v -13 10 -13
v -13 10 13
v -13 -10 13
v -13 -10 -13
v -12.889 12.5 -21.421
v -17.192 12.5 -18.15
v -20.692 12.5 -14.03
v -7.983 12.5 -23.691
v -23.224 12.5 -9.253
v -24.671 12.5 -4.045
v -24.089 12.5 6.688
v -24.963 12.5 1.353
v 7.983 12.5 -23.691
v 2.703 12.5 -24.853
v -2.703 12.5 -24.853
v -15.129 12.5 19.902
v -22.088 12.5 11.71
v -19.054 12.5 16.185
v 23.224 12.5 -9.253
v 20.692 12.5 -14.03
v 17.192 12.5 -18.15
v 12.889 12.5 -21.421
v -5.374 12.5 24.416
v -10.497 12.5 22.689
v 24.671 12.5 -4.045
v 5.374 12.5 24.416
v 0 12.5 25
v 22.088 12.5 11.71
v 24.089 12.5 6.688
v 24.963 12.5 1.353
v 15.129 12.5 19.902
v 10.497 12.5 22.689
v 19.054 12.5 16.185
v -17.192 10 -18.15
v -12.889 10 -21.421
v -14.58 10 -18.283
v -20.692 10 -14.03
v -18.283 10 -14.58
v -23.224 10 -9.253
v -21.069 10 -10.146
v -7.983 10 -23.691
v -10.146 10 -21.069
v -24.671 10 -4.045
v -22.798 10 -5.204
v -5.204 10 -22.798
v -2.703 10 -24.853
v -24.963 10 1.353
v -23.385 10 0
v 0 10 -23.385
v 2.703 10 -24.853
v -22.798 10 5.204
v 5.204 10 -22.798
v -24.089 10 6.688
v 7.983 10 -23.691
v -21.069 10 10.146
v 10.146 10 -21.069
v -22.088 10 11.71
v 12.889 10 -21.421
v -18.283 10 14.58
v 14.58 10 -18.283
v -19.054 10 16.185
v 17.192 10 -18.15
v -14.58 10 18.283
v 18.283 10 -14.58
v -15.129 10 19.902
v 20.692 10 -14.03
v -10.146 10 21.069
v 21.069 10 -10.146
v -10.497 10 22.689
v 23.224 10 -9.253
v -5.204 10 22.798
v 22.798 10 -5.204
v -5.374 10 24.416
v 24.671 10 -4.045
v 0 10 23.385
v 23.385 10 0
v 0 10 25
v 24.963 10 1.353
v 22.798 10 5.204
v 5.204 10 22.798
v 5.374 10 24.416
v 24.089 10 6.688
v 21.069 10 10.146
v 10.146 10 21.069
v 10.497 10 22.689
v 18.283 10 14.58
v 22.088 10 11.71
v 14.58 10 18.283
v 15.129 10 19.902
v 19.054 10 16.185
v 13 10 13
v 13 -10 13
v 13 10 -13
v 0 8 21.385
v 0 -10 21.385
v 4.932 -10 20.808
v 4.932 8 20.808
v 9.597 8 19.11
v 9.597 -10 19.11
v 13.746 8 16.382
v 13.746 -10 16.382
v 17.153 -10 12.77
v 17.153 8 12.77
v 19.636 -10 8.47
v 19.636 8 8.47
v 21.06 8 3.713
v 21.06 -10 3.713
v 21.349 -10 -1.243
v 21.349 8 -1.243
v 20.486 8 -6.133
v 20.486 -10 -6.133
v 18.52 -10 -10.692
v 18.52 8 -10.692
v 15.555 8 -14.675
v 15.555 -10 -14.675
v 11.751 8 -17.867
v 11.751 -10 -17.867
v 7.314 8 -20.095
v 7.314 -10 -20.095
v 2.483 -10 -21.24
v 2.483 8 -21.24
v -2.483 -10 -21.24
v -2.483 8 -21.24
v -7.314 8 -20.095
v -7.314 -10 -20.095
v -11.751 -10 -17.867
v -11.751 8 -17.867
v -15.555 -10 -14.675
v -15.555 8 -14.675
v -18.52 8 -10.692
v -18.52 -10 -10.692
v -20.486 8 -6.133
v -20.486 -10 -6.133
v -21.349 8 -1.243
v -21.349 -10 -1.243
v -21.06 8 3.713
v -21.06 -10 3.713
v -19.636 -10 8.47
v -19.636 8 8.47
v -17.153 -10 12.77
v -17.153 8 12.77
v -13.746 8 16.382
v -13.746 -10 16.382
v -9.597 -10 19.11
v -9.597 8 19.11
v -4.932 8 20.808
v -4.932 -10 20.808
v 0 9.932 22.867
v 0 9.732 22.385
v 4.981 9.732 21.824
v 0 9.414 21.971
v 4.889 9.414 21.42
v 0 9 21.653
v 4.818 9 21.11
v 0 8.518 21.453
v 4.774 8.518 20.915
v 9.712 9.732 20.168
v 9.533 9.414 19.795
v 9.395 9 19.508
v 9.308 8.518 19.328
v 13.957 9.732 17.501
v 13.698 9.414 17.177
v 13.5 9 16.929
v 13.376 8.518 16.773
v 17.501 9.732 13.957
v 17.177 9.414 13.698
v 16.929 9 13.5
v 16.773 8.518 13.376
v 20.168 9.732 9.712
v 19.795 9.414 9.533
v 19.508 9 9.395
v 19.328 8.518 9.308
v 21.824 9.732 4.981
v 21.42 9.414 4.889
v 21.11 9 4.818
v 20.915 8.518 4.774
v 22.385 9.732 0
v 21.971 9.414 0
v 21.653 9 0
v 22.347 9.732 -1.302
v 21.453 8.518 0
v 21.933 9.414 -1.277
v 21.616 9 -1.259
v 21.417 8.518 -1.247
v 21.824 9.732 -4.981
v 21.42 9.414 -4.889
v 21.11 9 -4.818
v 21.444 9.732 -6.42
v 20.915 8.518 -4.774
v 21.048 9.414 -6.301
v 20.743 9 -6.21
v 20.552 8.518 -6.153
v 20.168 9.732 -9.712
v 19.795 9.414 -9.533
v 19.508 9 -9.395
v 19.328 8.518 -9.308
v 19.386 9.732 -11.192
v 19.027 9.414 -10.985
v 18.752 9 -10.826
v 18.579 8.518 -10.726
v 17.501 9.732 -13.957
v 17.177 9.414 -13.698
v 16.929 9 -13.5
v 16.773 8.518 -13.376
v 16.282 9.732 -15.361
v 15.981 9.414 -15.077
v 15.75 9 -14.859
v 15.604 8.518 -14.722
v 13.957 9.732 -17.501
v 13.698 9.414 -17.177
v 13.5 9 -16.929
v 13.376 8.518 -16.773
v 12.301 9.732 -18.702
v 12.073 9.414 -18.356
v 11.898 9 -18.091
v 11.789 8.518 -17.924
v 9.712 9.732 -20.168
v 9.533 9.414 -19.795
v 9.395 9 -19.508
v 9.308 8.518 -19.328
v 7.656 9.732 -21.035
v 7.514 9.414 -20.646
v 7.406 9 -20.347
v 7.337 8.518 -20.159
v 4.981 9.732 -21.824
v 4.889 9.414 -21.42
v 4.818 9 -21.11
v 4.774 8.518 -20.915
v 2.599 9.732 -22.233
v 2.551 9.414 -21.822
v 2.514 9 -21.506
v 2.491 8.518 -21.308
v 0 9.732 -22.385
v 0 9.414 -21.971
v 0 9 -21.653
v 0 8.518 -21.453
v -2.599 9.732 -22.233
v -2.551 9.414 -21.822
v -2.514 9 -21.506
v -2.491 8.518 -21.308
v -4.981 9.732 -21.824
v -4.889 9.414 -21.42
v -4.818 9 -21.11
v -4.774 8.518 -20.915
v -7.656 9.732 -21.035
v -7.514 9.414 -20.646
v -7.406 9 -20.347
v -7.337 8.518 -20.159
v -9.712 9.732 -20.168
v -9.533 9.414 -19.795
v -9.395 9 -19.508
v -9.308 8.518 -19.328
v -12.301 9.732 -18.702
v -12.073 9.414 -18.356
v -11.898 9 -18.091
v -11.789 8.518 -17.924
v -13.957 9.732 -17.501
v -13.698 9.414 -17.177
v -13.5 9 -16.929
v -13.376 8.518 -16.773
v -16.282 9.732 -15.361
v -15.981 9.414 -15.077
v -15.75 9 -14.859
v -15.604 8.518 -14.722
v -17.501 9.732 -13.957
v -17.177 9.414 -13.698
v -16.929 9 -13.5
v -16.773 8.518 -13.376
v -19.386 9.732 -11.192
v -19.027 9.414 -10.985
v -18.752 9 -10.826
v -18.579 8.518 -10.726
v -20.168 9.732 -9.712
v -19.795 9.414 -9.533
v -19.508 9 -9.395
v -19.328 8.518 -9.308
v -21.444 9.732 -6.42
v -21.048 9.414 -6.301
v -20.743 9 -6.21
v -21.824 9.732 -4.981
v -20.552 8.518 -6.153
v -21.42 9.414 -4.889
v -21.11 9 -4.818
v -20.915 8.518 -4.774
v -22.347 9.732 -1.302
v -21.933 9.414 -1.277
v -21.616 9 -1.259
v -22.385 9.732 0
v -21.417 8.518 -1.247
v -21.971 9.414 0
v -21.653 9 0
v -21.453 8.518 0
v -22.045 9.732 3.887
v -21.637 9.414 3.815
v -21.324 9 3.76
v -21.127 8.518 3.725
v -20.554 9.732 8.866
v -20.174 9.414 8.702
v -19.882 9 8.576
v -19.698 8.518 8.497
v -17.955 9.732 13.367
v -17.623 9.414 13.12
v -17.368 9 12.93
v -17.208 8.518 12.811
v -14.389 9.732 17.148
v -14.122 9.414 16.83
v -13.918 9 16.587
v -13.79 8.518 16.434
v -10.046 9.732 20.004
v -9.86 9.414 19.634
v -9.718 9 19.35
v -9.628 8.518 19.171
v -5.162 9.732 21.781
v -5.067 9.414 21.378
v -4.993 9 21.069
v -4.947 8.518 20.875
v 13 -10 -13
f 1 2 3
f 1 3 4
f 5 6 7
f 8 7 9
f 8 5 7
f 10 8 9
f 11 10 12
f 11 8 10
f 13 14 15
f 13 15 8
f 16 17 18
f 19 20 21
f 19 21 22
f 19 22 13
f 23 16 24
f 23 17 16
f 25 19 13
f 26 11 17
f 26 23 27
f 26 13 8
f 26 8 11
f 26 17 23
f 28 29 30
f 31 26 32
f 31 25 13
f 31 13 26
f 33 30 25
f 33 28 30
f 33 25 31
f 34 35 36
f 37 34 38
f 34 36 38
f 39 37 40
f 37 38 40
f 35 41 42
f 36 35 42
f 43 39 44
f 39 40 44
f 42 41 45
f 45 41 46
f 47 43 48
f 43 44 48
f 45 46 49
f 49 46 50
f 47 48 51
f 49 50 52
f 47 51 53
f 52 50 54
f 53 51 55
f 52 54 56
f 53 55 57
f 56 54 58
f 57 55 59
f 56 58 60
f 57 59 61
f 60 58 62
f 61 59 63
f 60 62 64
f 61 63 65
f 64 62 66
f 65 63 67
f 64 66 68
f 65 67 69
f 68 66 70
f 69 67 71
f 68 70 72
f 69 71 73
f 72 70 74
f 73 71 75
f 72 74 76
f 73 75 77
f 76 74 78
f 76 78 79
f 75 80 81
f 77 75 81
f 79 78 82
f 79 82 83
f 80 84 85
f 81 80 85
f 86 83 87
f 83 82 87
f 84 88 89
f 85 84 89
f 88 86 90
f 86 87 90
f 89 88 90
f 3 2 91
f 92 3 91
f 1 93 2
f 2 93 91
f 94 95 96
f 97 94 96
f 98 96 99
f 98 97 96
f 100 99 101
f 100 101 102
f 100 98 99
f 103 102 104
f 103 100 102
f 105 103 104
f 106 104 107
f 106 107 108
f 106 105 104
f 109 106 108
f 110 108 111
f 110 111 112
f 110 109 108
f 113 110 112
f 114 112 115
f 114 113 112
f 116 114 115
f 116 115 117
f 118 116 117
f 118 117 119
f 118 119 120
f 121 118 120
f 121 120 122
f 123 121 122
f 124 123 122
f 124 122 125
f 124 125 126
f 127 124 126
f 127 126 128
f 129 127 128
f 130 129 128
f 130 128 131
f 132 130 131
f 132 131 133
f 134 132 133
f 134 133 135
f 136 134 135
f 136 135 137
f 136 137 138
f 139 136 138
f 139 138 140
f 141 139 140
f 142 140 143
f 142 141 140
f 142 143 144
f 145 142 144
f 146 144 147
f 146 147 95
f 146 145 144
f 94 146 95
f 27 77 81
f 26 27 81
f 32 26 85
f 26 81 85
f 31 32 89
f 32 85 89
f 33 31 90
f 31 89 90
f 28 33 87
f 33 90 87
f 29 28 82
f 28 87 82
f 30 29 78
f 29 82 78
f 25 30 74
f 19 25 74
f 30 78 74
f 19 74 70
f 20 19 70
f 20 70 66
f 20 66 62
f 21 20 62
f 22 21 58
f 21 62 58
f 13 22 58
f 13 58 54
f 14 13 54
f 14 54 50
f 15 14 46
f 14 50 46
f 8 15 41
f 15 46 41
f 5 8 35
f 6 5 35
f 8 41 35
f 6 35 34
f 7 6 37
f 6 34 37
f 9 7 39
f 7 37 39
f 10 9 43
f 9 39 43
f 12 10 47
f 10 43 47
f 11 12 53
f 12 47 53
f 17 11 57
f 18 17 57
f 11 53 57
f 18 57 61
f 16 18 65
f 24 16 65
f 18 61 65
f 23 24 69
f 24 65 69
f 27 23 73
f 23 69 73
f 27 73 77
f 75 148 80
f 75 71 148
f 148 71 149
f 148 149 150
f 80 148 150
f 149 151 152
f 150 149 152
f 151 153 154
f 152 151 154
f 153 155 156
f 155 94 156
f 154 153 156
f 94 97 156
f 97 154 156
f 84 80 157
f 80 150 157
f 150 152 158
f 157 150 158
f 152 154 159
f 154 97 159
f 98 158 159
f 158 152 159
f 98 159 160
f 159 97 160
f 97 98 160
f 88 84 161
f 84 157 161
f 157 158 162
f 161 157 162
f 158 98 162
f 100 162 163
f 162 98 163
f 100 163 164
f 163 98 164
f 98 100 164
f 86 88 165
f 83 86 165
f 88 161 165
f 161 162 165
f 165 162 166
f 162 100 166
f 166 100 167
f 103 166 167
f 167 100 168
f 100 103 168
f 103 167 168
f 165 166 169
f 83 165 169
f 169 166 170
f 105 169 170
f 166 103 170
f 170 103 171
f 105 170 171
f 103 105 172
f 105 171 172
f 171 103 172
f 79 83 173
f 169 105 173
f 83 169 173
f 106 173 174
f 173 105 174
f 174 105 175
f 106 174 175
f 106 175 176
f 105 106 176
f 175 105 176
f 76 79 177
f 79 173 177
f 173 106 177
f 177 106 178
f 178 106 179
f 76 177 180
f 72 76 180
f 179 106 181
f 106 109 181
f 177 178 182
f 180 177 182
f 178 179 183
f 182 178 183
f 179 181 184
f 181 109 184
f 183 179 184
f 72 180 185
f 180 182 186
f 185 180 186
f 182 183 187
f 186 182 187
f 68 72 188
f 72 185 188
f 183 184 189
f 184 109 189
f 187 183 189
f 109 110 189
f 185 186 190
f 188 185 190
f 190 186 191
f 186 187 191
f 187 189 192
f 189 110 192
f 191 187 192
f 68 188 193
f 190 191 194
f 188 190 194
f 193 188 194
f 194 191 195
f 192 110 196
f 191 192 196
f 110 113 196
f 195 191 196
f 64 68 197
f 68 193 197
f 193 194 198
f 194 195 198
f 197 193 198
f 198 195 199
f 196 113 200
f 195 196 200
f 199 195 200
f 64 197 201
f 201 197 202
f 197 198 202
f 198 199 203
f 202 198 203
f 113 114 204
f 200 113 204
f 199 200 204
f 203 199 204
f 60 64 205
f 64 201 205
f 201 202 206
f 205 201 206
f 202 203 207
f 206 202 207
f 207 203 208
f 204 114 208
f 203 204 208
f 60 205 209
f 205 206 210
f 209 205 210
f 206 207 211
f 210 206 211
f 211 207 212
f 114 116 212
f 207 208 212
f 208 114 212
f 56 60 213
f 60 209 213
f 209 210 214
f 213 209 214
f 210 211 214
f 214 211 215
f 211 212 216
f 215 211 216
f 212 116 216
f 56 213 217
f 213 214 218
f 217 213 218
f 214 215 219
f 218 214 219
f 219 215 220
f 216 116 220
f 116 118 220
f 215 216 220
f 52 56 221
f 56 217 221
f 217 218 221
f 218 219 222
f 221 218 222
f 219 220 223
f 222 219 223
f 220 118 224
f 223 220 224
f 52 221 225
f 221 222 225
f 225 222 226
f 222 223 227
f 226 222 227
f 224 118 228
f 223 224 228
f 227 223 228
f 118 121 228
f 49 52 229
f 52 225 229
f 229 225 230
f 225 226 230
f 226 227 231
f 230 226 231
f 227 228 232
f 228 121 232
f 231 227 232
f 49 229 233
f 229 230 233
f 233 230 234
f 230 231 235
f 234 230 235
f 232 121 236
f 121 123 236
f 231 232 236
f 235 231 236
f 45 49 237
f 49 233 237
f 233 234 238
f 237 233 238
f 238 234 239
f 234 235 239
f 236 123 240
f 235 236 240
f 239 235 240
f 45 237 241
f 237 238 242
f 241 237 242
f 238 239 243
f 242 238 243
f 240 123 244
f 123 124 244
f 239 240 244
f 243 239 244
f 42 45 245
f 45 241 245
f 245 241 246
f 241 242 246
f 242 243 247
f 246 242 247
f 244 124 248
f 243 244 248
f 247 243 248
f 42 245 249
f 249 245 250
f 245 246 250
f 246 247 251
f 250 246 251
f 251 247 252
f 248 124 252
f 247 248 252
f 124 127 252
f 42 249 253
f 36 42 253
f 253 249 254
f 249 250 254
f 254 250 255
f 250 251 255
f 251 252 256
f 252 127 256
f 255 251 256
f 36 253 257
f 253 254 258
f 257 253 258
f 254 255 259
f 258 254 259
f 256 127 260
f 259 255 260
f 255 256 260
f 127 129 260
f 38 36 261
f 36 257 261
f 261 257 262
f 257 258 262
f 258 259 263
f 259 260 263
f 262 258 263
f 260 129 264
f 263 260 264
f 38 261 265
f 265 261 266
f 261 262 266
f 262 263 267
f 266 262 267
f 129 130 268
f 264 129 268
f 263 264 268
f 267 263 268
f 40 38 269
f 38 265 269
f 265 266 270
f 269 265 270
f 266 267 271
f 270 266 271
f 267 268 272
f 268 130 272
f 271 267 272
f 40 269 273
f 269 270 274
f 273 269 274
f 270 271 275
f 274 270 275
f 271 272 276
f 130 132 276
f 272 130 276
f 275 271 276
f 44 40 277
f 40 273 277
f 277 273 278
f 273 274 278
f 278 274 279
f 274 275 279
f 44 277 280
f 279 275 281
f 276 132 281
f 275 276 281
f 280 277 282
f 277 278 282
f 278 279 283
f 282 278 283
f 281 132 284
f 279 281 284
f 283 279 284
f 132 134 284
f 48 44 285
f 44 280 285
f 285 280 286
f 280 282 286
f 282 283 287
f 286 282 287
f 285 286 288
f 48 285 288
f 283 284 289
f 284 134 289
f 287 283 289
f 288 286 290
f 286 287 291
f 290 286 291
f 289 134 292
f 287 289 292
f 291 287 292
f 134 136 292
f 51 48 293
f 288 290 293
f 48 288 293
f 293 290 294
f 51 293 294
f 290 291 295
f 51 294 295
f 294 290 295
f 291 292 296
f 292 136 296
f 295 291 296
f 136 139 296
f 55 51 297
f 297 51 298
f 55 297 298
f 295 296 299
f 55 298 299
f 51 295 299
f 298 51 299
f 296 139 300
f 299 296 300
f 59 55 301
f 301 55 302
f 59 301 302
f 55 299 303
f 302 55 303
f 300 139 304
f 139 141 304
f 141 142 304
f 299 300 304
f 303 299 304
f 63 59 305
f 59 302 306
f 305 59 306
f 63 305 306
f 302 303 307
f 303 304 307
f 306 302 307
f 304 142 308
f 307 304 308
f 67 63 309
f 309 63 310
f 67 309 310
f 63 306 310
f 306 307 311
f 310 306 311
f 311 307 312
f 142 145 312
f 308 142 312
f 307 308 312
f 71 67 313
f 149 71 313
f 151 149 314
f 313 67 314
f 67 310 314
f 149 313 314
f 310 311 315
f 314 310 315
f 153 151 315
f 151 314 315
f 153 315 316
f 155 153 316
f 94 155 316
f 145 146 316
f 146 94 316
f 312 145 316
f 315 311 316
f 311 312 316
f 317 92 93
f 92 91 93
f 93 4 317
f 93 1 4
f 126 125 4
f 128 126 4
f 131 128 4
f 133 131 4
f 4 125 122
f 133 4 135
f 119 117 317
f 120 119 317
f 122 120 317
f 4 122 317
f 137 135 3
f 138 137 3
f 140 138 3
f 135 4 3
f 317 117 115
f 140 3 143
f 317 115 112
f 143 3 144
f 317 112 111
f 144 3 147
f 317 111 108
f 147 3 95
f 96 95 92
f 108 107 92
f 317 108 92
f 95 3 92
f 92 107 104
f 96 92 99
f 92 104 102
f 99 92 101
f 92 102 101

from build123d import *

# Parameters (mm, degrees)
SKETCH2_R           = 21.384776311
SKETCH2_W           = 26
SKETCH2_H           = 26
BOSS_EXTRUDE1_DEPTH = 10
SKETCH4_R           = 25
BOSS_EXTRUDE2_DEPTH = 2.5
FILLET1_R           = 2


with BuildPart() as part:
    # Sketch2 → Boss-Extrude1 (new, symmetric)
    with BuildSketch(Plane(origin=(0, 0, 0), x_dir=(1, 0, 0), z_dir=(0, 1, 0))):
        with Locations(Location((0, 0, 0), (0, 0, 270))):
            Circle(SKETCH2_R)
        Rectangle(SKETCH2_W, SKETCH2_H, mode=Mode.SUBTRACT)
    extrude(amount=BOSS_EXTRUDE1_DEPTH, both=True)

    # Sketch4 → Boss-Extrude2 (add)
    with BuildSketch(Plane(origin=(0, 10, 0), x_dir=(1, 0, 0), z_dir=(0, 1, 0))):
        with Locations(Location((0, 0, 0), (0, 0, 270))):
            Circle(SKETCH4_R)
    extrude(amount=BOSS_EXTRUDE2_DEPTH)

    # Fillet1
    fillet1_edges = [part.edges().sort_by_distance(p)[0] for p in [
        (0, 10, -21.384776311),
    ]]
    fillet(fillet1_edges, radius=FILLET1_R)


solid = part.part
